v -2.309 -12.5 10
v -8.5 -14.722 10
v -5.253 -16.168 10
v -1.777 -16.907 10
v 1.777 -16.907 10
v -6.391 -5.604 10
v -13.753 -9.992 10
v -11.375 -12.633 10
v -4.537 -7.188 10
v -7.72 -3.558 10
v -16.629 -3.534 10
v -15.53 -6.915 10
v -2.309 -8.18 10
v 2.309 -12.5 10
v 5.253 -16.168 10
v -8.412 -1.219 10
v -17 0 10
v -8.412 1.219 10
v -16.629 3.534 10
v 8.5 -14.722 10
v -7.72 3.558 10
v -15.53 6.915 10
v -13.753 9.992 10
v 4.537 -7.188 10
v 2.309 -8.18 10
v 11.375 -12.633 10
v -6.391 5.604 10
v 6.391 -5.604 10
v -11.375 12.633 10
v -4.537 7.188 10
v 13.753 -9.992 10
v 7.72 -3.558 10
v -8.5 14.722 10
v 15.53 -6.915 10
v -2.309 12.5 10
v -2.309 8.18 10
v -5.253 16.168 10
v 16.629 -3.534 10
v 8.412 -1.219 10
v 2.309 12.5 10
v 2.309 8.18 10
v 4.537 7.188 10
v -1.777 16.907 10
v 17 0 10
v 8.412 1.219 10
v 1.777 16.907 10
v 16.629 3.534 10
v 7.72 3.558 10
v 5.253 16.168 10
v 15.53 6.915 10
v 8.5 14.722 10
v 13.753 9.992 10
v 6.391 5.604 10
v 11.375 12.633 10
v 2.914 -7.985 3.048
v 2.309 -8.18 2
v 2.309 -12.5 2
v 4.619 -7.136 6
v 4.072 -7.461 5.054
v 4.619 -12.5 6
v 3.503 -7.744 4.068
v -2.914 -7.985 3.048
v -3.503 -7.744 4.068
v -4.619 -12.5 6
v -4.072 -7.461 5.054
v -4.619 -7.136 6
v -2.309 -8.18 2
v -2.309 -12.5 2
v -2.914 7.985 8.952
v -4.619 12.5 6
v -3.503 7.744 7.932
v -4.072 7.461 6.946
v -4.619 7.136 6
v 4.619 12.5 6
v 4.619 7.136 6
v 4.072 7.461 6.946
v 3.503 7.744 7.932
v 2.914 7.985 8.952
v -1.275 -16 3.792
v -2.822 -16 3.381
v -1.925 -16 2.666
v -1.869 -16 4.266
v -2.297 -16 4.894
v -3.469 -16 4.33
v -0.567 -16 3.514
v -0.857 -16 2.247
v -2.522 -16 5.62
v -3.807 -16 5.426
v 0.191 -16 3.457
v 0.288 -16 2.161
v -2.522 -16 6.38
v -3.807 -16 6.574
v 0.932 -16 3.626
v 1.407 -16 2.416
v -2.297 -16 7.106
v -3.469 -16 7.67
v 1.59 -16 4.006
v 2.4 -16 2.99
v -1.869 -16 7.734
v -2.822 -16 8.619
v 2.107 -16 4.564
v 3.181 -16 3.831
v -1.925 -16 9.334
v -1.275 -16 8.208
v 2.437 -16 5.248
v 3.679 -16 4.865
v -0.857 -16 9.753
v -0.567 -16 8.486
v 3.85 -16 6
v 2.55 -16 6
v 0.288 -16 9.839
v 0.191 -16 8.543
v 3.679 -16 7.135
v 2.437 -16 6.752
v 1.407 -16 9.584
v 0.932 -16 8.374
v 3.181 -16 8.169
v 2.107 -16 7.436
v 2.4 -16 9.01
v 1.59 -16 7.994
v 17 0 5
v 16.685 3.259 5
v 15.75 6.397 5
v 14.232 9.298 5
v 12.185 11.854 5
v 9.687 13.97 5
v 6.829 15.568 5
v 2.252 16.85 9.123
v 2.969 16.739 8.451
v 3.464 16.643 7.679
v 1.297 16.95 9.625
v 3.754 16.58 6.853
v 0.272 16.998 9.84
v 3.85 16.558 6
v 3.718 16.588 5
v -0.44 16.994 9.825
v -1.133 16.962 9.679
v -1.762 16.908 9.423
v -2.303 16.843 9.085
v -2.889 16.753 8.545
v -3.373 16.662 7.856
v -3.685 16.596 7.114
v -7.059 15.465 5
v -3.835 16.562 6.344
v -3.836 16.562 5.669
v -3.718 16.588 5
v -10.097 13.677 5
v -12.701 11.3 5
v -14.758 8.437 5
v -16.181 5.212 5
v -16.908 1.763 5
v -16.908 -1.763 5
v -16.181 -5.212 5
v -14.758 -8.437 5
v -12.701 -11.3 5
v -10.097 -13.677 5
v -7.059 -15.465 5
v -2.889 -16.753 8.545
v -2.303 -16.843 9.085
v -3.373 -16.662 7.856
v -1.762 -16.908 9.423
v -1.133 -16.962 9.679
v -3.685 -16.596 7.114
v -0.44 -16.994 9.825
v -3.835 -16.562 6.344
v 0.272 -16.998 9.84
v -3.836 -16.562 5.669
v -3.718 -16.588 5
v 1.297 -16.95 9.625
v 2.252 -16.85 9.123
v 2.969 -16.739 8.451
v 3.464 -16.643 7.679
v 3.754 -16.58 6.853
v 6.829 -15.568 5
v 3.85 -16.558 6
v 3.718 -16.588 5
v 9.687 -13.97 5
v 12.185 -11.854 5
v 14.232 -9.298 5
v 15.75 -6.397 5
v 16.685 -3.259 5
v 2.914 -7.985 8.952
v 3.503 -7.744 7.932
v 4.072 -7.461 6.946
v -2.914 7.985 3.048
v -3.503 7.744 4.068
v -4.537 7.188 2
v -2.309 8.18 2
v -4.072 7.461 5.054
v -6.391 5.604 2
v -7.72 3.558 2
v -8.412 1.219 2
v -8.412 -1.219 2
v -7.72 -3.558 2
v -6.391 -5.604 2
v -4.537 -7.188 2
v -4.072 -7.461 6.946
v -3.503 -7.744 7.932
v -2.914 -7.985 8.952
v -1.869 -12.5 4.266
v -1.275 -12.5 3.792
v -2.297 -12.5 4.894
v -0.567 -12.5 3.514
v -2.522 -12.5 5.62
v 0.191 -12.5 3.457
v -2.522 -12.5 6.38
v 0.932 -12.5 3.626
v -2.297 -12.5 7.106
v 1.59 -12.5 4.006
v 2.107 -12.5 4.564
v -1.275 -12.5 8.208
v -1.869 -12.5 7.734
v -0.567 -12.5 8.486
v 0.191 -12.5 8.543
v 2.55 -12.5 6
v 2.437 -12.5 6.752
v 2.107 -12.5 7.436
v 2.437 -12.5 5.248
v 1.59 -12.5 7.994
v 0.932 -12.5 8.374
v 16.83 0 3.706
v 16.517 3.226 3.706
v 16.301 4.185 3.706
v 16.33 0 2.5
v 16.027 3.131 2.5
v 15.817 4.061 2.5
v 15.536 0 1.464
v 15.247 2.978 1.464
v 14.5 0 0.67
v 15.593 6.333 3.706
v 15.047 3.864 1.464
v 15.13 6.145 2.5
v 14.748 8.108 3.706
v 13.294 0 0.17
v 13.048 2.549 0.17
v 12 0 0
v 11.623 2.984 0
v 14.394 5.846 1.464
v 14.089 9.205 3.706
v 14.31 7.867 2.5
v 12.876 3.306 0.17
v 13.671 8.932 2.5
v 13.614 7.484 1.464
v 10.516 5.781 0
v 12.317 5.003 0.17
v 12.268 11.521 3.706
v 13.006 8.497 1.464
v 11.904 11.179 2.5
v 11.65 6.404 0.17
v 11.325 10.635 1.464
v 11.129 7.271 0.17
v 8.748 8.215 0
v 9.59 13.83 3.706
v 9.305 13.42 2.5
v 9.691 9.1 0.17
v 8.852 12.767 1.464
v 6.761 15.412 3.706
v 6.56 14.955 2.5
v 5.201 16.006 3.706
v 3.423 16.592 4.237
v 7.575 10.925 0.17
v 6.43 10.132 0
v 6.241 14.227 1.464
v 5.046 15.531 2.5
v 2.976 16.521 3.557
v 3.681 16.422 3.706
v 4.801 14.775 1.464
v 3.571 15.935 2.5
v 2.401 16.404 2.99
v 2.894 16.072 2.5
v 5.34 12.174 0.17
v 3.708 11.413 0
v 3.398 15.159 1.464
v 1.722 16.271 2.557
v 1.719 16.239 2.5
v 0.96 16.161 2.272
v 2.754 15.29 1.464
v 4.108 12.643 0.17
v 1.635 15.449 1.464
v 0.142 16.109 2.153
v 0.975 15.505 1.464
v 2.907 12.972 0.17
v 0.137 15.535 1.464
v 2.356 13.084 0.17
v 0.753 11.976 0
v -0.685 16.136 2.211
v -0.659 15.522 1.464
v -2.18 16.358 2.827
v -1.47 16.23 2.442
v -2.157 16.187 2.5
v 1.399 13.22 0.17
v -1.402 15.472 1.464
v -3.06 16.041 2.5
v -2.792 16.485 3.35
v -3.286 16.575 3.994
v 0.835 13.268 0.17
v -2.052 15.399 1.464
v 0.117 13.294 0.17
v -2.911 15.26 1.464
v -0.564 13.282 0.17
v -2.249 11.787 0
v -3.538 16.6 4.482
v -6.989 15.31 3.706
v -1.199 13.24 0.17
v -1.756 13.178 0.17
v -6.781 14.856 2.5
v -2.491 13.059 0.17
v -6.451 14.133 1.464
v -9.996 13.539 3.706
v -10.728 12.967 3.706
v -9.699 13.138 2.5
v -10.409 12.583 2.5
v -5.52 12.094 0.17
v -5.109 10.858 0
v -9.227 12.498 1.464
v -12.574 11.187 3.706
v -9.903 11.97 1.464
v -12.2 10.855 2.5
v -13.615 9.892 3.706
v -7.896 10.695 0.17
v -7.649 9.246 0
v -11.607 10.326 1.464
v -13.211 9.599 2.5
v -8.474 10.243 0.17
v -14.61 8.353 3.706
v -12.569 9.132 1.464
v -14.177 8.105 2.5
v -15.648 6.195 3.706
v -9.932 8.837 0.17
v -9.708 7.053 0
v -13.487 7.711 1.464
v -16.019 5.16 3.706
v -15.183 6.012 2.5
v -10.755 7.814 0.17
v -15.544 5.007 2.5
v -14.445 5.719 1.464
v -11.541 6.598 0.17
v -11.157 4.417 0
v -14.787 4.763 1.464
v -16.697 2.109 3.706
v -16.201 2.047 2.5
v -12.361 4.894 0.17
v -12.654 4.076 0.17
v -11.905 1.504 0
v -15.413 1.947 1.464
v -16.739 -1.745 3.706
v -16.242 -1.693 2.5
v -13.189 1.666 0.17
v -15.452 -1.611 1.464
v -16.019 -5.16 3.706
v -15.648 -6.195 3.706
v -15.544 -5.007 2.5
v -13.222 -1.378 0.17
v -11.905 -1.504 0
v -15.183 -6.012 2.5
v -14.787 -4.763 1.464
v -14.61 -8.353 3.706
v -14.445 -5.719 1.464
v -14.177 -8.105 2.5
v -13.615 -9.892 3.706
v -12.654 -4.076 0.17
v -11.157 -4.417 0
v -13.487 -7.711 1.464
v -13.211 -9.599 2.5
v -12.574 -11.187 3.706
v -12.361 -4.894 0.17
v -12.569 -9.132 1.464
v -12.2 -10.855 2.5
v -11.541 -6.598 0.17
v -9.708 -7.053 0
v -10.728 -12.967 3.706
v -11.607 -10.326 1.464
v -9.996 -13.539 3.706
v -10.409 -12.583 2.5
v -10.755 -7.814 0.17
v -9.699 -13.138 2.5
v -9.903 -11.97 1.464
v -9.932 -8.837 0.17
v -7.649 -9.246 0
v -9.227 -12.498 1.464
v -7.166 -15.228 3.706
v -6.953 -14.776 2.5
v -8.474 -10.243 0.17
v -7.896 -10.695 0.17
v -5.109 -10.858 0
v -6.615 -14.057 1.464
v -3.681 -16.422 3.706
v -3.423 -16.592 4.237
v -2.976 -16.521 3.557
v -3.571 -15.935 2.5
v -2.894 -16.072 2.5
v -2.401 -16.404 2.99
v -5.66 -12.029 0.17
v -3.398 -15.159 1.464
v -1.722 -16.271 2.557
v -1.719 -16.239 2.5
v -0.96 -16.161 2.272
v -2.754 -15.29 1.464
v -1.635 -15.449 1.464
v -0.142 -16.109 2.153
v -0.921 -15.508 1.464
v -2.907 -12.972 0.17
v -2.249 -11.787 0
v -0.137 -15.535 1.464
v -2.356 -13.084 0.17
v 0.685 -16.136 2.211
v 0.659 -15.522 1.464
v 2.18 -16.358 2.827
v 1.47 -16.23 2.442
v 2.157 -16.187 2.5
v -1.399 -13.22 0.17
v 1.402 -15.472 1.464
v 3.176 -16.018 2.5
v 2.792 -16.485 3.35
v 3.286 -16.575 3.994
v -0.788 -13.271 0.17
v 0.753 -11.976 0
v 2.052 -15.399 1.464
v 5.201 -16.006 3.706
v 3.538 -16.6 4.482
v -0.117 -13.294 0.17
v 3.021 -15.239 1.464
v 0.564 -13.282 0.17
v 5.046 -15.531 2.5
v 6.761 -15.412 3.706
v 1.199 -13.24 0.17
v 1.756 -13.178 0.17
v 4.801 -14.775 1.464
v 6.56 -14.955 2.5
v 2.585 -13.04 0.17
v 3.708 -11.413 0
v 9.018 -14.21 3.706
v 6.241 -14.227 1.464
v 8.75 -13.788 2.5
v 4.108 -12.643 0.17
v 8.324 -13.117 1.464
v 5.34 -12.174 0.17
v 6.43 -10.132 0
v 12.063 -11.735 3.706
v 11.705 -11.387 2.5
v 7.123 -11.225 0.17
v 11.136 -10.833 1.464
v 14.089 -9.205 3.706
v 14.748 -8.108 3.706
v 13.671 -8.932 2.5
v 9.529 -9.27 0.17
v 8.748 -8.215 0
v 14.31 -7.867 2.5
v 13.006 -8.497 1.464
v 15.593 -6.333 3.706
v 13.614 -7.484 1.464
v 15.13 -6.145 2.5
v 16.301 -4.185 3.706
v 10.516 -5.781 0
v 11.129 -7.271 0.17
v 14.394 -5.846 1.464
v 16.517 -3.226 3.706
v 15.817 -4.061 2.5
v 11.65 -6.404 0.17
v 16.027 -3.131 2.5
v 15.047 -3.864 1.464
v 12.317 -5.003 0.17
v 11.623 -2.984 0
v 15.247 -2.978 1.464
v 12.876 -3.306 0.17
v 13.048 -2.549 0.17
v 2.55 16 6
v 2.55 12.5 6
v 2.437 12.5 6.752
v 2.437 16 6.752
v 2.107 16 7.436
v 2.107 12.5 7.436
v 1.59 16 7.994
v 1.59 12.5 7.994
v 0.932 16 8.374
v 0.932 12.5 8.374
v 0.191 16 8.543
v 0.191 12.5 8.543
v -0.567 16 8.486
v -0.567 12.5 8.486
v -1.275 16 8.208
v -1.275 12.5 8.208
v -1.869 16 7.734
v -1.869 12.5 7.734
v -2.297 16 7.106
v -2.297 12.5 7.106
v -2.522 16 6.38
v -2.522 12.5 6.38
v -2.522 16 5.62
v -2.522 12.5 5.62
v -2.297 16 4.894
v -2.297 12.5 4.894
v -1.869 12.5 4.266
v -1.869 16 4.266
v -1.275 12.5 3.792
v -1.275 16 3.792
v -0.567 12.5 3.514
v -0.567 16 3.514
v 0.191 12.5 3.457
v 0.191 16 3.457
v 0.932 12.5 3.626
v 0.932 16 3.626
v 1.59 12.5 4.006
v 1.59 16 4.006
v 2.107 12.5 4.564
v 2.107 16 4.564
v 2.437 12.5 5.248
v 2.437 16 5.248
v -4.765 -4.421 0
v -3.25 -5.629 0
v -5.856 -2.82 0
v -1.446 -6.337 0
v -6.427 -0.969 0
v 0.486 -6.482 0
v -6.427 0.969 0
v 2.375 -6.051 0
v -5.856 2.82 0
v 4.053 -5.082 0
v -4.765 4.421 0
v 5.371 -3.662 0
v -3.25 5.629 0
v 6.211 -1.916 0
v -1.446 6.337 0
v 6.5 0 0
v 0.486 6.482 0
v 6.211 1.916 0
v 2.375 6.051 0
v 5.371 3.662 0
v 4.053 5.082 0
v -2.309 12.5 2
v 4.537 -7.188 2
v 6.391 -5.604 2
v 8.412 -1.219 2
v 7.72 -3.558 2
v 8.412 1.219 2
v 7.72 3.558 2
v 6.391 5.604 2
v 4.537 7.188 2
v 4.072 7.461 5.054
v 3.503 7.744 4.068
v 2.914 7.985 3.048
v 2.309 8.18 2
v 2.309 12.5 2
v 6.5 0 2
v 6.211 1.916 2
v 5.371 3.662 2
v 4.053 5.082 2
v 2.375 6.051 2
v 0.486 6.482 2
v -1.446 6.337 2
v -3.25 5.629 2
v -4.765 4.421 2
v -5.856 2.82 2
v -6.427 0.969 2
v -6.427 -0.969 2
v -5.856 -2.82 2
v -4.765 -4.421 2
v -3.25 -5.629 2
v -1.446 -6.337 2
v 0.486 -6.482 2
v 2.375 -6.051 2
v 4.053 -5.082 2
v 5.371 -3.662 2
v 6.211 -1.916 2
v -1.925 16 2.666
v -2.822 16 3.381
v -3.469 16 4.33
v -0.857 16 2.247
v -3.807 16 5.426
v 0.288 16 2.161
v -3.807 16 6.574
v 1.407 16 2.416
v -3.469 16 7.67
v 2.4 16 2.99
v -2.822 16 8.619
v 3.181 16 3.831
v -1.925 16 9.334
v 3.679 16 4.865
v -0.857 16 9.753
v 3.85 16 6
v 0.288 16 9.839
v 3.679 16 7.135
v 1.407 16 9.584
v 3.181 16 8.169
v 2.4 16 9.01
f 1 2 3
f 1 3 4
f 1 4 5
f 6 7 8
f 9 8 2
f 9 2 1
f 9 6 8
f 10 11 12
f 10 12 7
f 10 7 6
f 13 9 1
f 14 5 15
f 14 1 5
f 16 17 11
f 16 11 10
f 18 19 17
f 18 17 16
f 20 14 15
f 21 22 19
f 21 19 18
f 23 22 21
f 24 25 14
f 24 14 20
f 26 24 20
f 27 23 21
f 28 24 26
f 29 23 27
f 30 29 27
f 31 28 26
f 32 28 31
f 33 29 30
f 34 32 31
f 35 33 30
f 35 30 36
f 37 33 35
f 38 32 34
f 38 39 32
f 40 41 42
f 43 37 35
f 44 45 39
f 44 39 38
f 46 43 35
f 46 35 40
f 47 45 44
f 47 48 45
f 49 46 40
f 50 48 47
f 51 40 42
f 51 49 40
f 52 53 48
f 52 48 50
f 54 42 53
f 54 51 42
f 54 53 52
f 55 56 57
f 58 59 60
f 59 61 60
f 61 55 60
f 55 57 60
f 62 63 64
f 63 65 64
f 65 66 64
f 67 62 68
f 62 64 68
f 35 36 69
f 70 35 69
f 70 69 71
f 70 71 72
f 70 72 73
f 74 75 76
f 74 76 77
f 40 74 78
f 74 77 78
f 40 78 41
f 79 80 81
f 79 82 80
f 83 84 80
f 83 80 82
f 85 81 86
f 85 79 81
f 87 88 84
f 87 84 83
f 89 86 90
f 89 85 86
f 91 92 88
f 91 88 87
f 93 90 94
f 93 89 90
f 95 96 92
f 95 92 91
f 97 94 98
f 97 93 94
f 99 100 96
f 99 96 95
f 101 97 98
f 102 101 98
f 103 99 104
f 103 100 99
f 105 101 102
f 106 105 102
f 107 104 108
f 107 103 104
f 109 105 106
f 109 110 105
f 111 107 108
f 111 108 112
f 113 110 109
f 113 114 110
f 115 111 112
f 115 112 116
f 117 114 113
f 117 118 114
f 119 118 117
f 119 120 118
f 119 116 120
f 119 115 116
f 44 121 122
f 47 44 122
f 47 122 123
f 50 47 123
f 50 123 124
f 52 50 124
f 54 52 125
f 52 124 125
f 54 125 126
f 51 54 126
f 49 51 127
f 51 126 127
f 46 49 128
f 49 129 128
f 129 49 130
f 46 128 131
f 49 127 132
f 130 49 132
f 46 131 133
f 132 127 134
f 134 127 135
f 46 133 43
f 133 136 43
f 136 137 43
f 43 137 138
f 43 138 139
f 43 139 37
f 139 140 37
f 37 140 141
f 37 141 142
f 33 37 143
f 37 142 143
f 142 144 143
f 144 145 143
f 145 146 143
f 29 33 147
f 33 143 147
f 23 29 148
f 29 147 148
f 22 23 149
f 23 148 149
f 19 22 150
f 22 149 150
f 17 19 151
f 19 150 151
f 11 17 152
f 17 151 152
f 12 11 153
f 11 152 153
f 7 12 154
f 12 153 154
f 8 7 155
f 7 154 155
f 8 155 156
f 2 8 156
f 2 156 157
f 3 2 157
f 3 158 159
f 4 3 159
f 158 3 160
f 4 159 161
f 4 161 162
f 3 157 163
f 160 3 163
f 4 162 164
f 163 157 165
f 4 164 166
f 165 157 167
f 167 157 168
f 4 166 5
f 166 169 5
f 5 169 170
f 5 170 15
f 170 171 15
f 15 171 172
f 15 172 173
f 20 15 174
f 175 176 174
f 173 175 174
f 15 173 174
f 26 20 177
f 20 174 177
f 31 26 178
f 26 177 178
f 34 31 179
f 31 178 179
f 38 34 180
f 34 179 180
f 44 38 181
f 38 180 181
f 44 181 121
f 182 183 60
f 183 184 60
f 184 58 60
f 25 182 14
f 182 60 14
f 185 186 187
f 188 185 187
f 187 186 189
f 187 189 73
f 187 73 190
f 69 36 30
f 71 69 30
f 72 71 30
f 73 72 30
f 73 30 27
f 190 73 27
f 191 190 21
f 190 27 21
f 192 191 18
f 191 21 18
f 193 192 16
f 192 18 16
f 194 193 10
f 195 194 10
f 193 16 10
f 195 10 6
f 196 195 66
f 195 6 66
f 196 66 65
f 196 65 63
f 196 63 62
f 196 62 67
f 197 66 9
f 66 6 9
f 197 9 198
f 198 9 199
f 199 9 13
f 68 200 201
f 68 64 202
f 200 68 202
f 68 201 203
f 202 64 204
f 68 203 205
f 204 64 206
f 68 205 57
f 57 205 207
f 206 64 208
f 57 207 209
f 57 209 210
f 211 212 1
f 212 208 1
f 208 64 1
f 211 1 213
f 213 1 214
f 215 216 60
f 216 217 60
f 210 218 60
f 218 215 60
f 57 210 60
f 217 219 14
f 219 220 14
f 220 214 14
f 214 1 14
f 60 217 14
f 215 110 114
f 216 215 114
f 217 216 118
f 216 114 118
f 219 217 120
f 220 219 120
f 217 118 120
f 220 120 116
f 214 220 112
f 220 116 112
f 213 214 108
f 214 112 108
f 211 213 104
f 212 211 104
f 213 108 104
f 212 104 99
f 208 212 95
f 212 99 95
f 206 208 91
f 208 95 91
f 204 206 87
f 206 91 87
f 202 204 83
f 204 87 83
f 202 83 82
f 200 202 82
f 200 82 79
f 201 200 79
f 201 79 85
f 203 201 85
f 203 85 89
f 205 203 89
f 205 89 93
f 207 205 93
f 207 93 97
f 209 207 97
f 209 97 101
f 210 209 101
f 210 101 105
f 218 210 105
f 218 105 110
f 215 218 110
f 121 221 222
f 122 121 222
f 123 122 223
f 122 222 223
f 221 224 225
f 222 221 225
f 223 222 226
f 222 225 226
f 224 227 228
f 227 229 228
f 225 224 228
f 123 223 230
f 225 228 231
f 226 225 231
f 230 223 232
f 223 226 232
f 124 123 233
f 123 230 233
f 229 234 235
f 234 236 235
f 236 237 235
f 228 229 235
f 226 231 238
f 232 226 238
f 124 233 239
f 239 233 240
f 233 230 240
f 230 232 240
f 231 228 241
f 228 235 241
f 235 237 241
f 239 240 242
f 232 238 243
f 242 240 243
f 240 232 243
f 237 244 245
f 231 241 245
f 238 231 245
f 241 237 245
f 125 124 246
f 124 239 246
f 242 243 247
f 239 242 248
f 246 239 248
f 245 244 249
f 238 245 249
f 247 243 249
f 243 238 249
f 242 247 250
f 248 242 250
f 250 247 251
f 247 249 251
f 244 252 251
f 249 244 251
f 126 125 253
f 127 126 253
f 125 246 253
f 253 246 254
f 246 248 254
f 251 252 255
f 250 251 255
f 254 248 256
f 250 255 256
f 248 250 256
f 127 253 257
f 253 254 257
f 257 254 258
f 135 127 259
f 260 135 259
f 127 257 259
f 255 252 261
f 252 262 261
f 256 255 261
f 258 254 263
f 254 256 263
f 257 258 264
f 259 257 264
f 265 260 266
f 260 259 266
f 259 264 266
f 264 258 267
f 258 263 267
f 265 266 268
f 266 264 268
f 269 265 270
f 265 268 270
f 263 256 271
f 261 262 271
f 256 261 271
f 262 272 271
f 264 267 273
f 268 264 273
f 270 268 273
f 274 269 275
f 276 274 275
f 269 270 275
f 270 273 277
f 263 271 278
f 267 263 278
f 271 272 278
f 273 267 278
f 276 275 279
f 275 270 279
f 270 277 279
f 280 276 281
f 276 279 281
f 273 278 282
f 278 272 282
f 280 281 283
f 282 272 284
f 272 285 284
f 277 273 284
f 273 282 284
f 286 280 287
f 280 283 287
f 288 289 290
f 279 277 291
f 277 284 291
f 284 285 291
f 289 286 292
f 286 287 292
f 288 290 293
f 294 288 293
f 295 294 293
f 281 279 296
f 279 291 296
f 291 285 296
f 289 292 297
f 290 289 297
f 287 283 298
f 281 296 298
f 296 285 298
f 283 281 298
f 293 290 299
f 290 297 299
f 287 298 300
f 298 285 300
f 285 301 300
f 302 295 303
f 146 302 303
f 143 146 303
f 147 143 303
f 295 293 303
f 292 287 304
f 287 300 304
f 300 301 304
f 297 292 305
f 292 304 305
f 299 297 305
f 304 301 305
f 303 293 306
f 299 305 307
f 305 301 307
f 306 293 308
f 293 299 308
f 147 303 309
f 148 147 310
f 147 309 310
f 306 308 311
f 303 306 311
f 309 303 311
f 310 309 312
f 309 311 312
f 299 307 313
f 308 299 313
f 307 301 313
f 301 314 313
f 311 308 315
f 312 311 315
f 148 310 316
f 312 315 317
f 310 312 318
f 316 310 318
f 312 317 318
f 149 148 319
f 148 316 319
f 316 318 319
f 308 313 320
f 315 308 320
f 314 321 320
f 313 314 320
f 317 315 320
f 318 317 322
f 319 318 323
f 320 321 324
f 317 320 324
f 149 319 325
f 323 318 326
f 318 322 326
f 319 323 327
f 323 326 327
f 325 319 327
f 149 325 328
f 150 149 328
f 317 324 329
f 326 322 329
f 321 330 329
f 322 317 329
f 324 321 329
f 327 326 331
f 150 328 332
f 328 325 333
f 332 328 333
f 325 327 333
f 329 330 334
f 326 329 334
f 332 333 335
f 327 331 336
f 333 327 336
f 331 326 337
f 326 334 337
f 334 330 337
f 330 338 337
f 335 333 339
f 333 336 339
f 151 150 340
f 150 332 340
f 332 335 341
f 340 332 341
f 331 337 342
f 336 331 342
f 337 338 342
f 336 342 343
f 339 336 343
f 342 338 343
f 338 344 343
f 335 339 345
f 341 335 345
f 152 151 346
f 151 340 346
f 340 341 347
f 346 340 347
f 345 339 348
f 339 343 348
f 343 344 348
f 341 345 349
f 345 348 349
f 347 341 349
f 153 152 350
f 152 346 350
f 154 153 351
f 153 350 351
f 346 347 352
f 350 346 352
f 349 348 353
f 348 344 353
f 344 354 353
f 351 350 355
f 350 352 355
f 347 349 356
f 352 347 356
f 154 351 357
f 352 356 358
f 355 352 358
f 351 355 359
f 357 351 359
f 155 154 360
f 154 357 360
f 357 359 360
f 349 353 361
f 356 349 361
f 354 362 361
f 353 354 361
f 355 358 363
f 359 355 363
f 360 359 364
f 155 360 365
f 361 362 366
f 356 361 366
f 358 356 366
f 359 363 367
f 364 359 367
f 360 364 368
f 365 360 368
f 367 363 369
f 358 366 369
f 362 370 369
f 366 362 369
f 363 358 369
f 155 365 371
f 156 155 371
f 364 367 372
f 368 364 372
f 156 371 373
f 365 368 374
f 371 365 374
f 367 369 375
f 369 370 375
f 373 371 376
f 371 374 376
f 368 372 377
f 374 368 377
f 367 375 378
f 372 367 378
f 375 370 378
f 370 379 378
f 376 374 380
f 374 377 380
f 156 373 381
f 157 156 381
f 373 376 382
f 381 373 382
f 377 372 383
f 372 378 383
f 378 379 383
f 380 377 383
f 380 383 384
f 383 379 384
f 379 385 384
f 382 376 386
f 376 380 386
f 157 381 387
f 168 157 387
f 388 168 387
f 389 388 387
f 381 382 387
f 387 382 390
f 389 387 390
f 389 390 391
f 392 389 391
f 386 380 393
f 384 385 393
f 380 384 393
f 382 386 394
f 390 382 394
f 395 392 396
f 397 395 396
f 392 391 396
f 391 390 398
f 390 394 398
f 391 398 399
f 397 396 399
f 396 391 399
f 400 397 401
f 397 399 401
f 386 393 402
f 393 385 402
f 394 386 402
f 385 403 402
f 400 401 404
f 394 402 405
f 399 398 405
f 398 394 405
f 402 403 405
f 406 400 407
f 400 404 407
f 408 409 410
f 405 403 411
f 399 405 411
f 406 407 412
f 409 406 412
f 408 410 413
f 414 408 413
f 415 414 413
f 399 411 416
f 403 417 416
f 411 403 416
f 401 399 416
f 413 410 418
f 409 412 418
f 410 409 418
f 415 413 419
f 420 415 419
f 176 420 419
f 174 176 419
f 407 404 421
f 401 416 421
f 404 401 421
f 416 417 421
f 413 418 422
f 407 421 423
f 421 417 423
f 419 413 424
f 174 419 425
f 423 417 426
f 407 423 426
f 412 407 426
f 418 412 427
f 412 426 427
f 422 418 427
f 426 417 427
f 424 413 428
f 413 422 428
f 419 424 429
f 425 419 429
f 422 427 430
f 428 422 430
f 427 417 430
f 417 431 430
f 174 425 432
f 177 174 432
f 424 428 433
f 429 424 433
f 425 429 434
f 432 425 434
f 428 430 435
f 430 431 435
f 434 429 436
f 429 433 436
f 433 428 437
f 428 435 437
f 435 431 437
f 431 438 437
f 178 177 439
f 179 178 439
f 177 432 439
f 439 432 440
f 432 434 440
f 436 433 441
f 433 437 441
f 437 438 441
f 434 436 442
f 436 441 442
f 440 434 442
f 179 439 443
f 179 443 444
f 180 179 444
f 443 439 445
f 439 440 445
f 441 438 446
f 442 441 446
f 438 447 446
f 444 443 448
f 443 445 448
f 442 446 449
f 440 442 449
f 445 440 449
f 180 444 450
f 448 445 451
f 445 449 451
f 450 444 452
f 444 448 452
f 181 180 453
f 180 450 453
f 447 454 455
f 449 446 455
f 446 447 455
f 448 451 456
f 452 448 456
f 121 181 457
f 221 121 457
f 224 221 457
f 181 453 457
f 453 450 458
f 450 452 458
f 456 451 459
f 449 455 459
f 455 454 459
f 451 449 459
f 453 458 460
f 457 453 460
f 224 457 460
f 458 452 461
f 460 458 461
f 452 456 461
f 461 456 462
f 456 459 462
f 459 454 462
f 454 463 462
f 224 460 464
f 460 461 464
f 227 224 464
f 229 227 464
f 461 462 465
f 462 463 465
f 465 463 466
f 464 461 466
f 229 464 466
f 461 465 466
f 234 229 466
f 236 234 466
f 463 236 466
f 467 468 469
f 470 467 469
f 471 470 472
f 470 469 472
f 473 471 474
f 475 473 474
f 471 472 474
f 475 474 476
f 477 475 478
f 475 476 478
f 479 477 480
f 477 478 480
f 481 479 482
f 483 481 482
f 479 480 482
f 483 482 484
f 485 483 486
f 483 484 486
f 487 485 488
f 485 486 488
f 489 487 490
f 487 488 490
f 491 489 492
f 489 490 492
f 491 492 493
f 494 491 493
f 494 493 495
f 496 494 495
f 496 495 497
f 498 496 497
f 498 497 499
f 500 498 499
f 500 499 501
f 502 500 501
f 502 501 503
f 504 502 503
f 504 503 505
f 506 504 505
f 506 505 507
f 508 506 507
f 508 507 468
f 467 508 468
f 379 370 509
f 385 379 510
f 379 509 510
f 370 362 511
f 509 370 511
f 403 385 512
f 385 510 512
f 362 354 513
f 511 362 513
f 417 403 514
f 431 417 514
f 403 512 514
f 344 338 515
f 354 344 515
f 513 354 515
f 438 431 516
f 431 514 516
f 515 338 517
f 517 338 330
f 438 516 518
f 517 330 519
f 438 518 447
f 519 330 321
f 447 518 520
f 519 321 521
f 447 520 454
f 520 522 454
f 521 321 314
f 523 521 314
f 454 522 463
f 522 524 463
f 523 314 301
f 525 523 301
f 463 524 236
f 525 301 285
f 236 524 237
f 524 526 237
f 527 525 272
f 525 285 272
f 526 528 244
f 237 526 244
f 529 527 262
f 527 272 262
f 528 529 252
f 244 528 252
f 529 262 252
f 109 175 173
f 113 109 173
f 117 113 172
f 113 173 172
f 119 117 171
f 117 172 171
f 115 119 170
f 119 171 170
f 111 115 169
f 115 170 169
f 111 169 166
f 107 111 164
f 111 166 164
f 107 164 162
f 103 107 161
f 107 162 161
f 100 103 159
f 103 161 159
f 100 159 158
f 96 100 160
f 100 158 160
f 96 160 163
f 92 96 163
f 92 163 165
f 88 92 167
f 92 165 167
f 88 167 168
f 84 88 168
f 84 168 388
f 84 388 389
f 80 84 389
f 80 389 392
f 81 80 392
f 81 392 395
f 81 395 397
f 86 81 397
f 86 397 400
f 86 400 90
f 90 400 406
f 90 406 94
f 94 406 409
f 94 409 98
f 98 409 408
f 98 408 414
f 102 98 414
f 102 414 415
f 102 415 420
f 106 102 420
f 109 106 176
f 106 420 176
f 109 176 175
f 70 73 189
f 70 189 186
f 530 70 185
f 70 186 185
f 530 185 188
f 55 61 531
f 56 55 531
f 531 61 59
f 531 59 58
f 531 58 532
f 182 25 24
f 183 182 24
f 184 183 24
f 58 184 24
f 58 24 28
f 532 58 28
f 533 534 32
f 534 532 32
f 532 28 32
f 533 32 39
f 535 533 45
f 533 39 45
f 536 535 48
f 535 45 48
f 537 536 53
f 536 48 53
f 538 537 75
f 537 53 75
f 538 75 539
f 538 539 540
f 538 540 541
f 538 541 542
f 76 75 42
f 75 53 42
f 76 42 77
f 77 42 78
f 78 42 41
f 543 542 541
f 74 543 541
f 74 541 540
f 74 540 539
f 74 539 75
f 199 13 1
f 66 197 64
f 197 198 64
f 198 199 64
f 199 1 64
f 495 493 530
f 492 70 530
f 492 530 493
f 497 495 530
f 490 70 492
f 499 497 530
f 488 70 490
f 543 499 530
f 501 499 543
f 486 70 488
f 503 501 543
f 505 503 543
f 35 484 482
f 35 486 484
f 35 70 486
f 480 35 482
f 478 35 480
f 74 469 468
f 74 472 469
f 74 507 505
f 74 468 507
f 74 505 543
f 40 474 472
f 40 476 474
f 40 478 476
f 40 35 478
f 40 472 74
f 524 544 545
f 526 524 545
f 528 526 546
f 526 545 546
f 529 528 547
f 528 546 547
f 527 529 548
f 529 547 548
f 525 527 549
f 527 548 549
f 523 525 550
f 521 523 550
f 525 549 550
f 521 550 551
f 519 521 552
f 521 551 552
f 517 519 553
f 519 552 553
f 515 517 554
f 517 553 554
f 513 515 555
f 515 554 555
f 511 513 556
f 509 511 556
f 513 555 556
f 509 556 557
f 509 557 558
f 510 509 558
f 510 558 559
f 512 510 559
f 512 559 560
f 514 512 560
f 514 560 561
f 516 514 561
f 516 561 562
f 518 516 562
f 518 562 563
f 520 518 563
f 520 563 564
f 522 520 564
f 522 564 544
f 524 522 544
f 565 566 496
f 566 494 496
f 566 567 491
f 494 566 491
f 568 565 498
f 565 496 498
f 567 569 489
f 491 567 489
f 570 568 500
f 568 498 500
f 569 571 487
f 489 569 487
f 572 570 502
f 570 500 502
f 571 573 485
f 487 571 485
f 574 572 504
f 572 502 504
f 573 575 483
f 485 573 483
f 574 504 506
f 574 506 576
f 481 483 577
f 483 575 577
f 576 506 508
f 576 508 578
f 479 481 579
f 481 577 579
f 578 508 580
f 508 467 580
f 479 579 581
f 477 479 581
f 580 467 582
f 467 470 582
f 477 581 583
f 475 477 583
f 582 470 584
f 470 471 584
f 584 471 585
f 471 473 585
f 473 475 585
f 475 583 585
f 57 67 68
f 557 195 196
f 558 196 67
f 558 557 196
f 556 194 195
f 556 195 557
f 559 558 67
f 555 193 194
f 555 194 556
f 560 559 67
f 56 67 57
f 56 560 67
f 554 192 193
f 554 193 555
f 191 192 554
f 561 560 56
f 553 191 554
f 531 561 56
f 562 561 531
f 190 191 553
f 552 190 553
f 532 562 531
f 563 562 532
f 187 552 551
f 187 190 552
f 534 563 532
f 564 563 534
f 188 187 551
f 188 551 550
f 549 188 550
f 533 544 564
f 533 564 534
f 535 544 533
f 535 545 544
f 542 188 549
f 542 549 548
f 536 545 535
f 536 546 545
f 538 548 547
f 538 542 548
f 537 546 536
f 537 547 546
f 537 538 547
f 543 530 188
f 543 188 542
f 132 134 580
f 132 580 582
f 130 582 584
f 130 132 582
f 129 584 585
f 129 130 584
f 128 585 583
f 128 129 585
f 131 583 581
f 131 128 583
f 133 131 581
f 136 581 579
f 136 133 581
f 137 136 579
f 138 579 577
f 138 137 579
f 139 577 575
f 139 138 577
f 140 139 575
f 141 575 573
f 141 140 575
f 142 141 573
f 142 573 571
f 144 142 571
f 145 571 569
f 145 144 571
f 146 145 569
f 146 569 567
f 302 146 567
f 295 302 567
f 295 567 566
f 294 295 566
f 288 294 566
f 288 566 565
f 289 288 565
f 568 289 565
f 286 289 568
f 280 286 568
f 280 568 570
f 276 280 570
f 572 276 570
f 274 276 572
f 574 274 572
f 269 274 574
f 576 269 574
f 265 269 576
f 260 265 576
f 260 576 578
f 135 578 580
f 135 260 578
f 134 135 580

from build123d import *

# Parameters (mm, degrees)
F0_R      = 17
F1_DEPTH  = 10
F2_R      = 8.5
F3_DEPTH  = 8
F4_R      = 6.5
F5_DEPTH  = 2.001
F7_DEPTH  = 12.5
F10_R     = 3.85
F11_DEPTH = 1.5
F12_R     = 3.85
F13_DEPTH = 1.5
F15_R     = 2.55
F16_DEPTH = 34.5010001


# Not quite as in the source:
# - a fillet or chamfer that OpenCascade refuses, or shapes differently, is made with other operations: its cross-section is extruded or revolved along the edge and cut away or added


with BuildPart() as f1:
    # F0 (on Top) → F1 (new body)
    with BuildSketch(Plane.XY):
        Circle(F0_R)
    extrude(amount=F1_DEPTH)

    # F2 (on face) → F3 (cut)
    with BuildSketch(Plane.XY.offset(10)):
        Circle(F2_R)
    extrude(amount=-F3_DEPTH, mode=Mode.SUBTRACT)

    # F4 (on face) → F5 (cut, through all)
    with BuildSketch(Plane.XY.offset(2)):
        Circle(F4_R)
    extrude(amount=-F5_DEPTH, mode=Mode.SUBTRACT)

    # F6 (on Front) → F7 (cut, symmetric)
    with BuildSketch(Plane.XZ):
        Polygon((4.6188021535, 6), (2.3094010768, 10), (-2.3094010768, 10), (-4.6188021535, 6), (-2.3094010768, 2), (2.3094010768, 2), align=None)
    extrude(amount=F7_DEPTH, both=True, mode=Mode.SUBTRACT)

    # F10 (on offset) → F11 (cut)
    with BuildSketch(Plane.XZ.offset(17.5)):
        with Locations((0, 6)):
            Circle(F10_R)
    extrude(amount=-F11_DEPTH, mode=Mode.SUBTRACT)

    # F12 (on offset) → F13 (cut)
    with BuildSketch(Plane.XZ.offset(-17.5)):
        with Locations((0, 6)):
            Circle(F12_R)
    extrude(amount=F13_DEPTH, mode=Mode.SUBTRACT)

    # F14: fillet of radius 5 on 1 edges, made by hand

    # F14_s1 → F14_t2 (revolve, cut)
    with BuildSketch(Plane.XZ):
        with BuildLine():
            ThreePointArc((17, 5), (15.5355339059, 1.4644660941), (12, 0))
            Line((12, 0), (17, 0))
            Line((17, 0), (17, 5))
        make_face()
    revolve(axis=Axis((0, 0, 0), (0, 0, 1)), mode=Mode.SUBTRACT)

    # F15 (on offset) → F16 (cut, through all)
    with BuildSketch(Plane.XZ.offset(17.5)):
        with Locations((0, 6)):
            Circle(F15_R)
    extrude(amount=-F16_DEPTH, mode=Mode.SUBTRACT)


solid = f1.part
